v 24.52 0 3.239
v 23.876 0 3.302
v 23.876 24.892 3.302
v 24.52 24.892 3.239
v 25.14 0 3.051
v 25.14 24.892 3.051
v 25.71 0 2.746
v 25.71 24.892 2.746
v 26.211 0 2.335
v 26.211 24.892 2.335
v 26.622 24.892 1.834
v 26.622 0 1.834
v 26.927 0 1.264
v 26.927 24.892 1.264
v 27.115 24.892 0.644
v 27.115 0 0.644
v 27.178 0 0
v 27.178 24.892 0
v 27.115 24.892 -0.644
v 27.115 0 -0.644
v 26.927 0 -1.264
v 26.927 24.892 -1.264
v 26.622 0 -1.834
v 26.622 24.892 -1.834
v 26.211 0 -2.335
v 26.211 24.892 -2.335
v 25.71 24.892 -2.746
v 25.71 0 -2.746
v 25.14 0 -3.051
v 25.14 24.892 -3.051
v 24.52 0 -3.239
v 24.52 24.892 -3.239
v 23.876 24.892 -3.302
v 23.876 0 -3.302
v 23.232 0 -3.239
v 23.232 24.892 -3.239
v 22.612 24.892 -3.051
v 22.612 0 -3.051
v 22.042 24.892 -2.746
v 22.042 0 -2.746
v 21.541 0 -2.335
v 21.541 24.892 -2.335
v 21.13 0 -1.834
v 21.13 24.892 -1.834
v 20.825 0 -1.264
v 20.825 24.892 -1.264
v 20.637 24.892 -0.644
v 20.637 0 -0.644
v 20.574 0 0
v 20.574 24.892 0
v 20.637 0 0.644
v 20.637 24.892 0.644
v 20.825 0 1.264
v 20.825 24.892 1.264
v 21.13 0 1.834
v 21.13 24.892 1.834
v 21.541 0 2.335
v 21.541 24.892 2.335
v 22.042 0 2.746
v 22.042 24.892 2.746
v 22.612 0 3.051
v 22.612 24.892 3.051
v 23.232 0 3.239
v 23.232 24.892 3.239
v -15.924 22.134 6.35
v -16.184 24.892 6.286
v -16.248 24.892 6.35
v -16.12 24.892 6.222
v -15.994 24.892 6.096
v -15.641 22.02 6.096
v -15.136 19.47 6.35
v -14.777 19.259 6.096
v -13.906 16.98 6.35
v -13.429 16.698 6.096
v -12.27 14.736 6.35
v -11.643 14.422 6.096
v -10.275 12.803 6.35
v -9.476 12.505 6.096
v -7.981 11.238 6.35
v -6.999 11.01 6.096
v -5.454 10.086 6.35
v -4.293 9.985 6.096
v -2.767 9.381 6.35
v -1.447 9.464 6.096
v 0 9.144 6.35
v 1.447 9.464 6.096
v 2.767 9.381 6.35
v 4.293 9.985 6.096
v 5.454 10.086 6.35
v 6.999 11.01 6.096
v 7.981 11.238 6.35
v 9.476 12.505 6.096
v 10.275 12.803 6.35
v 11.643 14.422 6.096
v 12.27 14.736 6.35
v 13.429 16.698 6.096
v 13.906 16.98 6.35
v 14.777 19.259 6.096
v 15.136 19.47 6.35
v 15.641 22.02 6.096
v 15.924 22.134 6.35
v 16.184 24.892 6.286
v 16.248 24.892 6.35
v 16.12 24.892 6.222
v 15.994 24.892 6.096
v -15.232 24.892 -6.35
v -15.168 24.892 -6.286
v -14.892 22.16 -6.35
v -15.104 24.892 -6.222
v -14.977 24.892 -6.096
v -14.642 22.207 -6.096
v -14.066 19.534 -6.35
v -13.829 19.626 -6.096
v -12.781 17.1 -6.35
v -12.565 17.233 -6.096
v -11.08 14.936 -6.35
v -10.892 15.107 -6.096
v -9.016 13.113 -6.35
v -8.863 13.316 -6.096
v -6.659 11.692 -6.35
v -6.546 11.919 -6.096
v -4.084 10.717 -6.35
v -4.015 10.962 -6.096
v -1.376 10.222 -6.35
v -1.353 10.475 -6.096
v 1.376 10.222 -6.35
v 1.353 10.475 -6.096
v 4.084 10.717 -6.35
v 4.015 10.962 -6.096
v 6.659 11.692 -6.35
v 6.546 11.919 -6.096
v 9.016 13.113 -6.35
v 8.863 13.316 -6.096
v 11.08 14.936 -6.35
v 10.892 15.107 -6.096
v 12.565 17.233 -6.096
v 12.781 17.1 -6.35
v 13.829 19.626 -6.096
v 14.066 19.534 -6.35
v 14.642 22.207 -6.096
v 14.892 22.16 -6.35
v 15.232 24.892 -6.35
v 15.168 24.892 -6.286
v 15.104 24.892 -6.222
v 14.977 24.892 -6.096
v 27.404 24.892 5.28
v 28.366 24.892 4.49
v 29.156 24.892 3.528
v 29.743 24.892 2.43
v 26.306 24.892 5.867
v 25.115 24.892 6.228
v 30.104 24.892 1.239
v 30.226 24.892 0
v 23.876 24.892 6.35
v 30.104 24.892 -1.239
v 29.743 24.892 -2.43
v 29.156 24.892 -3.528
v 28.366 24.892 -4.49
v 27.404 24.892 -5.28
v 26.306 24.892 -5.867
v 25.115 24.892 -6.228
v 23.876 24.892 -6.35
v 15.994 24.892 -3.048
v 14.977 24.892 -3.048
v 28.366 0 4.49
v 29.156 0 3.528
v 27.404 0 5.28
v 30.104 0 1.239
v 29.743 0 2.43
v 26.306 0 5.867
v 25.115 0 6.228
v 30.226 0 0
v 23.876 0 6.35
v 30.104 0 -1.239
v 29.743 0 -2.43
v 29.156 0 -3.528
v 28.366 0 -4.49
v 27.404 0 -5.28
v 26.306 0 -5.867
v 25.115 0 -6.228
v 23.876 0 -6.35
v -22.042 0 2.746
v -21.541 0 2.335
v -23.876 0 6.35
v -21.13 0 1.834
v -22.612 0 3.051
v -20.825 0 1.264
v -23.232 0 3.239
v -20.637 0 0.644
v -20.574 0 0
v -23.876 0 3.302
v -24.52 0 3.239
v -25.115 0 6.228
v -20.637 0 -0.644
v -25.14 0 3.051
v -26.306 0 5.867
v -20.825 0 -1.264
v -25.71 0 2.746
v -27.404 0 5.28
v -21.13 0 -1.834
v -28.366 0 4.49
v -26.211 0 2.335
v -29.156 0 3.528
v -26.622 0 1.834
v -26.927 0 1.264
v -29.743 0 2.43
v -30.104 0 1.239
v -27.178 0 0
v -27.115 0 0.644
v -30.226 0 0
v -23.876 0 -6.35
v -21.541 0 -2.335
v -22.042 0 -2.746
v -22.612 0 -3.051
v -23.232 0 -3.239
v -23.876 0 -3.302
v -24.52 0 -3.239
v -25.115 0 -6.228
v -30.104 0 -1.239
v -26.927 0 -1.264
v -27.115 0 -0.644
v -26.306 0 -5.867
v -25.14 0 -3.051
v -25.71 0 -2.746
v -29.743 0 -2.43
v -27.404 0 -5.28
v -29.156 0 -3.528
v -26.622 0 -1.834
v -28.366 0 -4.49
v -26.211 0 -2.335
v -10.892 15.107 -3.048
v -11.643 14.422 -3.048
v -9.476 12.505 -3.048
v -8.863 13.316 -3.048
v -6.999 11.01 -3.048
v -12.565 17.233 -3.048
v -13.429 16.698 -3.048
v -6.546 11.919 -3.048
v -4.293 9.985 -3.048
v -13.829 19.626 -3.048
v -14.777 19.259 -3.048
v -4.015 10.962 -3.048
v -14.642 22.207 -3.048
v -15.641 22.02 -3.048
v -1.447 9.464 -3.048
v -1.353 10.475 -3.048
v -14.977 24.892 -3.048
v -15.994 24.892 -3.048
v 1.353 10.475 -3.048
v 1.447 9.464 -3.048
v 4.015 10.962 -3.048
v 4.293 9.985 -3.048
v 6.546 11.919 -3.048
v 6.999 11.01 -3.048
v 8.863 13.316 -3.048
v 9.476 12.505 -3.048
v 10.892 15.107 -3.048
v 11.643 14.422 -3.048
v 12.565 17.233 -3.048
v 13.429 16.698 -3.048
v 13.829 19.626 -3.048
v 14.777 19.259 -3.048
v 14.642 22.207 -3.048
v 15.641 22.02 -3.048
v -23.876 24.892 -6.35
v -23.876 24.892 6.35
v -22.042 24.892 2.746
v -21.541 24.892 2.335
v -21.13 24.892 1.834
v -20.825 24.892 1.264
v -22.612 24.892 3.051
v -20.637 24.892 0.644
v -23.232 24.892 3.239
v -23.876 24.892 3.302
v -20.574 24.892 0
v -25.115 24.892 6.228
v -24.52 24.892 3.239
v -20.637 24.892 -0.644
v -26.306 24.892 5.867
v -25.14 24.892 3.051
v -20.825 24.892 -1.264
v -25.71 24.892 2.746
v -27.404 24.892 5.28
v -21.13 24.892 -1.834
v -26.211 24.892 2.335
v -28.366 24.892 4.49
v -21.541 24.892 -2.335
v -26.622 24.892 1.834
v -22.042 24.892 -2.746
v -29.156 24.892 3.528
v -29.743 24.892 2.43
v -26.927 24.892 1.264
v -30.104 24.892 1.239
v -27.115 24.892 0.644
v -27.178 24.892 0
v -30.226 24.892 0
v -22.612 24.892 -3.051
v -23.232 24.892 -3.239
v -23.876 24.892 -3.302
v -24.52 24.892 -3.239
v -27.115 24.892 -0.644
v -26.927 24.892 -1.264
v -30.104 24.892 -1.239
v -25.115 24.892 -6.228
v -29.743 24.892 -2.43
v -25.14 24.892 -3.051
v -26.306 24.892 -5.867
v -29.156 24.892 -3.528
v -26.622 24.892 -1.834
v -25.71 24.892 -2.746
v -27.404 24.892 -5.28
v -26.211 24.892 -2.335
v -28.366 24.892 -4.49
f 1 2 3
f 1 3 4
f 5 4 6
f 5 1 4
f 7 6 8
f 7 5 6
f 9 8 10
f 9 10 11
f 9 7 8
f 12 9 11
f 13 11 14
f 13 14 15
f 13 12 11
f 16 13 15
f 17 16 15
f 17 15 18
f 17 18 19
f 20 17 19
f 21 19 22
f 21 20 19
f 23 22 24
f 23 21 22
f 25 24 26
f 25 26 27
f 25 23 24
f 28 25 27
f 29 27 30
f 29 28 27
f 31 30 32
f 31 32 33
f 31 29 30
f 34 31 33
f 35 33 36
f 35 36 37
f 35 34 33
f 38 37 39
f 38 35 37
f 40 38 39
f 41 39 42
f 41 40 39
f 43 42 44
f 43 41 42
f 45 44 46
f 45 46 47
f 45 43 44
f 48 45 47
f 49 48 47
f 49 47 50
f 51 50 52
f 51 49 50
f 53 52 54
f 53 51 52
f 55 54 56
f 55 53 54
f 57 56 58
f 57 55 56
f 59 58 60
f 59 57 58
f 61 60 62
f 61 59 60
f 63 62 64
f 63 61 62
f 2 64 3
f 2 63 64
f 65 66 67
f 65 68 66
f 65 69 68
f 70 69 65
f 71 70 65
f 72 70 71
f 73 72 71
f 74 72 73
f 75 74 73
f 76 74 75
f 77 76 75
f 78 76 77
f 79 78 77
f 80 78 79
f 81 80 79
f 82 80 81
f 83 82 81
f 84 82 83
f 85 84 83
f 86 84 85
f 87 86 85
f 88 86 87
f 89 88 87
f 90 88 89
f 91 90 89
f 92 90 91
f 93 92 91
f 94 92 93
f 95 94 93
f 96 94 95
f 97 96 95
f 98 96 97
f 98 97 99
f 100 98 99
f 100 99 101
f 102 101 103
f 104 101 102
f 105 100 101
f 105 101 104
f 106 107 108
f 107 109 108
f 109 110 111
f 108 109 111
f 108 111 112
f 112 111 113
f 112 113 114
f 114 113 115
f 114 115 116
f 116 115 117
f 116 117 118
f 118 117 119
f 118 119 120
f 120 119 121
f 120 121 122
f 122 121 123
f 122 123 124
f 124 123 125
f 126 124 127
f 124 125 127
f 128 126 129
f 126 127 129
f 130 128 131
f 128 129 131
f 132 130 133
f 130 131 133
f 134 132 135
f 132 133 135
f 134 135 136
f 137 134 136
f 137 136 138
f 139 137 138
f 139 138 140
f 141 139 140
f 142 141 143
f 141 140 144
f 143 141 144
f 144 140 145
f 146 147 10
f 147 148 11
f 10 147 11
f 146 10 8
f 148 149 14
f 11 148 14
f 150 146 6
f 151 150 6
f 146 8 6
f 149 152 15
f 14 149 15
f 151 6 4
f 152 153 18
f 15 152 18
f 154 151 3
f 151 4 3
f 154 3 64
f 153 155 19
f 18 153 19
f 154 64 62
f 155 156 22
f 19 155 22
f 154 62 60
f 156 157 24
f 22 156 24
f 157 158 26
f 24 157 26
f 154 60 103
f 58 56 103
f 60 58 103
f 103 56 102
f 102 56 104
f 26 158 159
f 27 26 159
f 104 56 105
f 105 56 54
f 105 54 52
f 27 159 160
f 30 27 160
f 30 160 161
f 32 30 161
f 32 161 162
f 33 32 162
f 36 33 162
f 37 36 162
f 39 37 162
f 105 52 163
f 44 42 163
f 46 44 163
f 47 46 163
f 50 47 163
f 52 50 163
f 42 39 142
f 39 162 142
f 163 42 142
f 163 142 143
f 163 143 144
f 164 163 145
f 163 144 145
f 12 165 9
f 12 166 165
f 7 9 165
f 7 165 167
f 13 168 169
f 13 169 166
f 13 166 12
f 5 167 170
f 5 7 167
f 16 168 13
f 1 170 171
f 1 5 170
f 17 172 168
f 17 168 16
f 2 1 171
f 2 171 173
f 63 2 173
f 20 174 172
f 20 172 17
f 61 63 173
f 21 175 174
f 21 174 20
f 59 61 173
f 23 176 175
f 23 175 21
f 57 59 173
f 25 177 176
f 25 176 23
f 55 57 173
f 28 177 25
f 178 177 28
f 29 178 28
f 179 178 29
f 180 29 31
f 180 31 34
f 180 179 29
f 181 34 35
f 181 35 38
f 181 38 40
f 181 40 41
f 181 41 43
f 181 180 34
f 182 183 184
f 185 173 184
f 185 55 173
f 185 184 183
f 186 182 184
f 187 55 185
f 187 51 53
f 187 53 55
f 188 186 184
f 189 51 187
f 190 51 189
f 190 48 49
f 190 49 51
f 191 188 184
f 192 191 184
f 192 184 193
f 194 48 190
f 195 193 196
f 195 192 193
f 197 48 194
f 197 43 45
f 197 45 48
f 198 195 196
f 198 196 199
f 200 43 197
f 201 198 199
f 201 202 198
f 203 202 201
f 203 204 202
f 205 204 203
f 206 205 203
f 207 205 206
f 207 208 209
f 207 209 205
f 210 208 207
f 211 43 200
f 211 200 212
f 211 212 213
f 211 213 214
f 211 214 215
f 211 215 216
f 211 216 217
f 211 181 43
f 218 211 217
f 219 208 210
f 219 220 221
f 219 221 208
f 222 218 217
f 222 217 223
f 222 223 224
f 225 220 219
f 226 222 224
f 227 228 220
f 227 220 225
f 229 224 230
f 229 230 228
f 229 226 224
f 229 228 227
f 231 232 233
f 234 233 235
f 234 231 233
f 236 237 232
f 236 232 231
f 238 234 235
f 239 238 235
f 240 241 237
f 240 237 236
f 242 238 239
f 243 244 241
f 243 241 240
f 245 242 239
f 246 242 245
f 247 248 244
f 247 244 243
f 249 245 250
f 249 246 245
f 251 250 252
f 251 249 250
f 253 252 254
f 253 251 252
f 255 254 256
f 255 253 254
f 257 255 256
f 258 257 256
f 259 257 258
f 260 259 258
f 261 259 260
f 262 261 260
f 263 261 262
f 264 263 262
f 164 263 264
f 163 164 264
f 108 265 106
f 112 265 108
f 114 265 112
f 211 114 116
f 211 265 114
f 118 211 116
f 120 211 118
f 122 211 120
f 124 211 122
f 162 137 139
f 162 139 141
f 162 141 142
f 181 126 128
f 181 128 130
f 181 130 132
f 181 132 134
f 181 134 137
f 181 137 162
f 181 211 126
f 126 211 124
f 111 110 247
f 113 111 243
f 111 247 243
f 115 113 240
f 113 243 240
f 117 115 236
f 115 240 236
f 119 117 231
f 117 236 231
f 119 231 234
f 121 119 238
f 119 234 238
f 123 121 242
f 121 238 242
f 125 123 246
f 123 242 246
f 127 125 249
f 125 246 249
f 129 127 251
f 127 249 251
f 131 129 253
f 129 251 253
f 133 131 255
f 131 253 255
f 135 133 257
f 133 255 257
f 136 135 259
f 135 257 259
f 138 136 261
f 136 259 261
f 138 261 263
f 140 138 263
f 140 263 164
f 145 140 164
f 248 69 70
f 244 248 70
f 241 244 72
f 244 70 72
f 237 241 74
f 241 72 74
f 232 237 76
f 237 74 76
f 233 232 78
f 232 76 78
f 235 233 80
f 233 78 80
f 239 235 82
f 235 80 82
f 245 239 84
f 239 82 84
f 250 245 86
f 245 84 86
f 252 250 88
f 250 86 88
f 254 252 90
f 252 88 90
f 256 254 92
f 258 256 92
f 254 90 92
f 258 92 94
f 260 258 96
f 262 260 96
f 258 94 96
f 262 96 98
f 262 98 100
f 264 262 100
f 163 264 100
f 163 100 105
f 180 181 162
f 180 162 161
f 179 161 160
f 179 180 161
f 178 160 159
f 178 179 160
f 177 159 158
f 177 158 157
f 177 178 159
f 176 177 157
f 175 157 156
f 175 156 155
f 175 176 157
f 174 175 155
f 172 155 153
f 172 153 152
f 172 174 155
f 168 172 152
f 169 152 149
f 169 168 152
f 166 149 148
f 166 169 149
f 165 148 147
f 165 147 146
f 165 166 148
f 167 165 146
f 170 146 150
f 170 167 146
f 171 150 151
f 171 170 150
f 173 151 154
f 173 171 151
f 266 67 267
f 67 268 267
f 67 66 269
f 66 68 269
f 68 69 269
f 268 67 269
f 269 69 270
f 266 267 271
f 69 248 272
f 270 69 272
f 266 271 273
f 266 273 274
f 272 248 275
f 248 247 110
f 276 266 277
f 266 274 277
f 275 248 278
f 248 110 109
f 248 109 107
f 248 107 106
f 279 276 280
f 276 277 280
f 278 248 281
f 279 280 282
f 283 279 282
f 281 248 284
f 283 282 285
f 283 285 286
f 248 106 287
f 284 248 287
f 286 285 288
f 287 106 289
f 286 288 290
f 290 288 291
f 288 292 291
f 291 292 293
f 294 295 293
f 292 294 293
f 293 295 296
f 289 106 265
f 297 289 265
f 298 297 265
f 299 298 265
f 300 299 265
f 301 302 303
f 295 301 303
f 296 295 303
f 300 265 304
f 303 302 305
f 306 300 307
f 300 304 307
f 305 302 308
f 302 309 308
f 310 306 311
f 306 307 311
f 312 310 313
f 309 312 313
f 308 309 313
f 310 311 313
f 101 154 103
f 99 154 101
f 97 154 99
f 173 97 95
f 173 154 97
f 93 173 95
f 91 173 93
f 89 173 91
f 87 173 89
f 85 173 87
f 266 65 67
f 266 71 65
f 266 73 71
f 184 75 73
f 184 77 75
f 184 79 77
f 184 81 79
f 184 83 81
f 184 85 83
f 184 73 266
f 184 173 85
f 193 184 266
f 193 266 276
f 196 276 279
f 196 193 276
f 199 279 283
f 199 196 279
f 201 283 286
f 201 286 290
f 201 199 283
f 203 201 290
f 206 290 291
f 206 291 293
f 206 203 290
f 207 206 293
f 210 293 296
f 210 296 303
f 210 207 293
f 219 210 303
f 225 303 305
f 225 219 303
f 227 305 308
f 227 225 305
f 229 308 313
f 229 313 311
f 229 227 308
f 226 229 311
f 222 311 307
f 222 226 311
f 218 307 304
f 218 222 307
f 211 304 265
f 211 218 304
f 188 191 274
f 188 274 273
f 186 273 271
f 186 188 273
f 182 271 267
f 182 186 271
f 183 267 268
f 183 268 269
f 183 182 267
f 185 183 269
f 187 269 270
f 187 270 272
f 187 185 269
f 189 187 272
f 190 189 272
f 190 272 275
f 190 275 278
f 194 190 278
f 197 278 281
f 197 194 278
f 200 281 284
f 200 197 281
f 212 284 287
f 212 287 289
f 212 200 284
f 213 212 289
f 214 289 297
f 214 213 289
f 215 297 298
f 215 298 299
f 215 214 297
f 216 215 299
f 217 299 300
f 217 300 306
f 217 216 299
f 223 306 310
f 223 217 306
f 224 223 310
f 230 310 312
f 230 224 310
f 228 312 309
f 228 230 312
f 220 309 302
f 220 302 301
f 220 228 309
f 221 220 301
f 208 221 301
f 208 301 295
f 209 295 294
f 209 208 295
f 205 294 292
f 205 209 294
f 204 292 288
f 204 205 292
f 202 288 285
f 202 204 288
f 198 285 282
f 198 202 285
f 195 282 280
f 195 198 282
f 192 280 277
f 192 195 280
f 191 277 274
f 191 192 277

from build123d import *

# Parameters (mm, degrees)
SKETCH1_R           = 3.302
BOSS_EXTRUDE1_DEPTH = 24.892
SKETCH2_R           = 16.002
CUT_EXTRUDE1_DEPTH  = 9.398
SKETCH3_R           = 14.986
CUT_EXTRUDE2_DEPTH  = 17.78
CHAMFER1_SIZE       = 0.254


with BuildPart() as part:
    # Sketch1 → Boss-Extrude1 (new body)
    with BuildSketch(Plane(origin=(0, 0, 0), x_dir=(1, 0, 0), z_dir=(0, 1, 0))):
        with BuildLine():
            Line((-23.876, 6.35), (23.876, 6.35))
            ThreePointArc((23.876, 6.35), (30.226, 0), (23.876, -6.35))
            Line((23.876, -6.35), (-23.876, -6.35))
            ThreePointArc((-23.876, -6.35), (-30.226, 0), (-23.876, 6.35))
        make_face()
        with Locations(Location((23.876, 0, 0), (0, 0, 270))):
            Circle(SKETCH1_R, mode=Mode.SUBTRACT)
        with Locations(Location((-23.876, 0, 0), (0, 0, 270))):
            Circle(SKETCH1_R, mode=Mode.SUBTRACT)
    extrude(amount=BOSS_EXTRUDE1_DEPTH)

    # Sketch2 → Cut-Extrude1 (cut)
    with BuildSketch(Plane.XY.offset(6.35)):
        with Locations((0, 25.4)):
            Circle(SKETCH2_R)
    extrude(amount=-CUT_EXTRUDE1_DEPTH, mode=Mode.SUBTRACT)

    # Sketch3 → Cut-Extrude2 (cut)
    with BuildSketch(Plane.XY.offset(-3.048)):
        with Locations((0, 25.4)):
            Circle(SKETCH3_R)
    extrude(amount=-CUT_EXTRUDE2_DEPTH, mode=Mode.SUBTRACT)

    # Chamfer1
    chamfer1_edges = [part.edges().sort_by_distance(p)[0] for p in [
        (0, 9.398, 6.35),
        (0, 10.414, -6.35),
    ]]
    chamfer(chamfer1_edges, length=CHAMFER1_SIZE)


solid = part.part
